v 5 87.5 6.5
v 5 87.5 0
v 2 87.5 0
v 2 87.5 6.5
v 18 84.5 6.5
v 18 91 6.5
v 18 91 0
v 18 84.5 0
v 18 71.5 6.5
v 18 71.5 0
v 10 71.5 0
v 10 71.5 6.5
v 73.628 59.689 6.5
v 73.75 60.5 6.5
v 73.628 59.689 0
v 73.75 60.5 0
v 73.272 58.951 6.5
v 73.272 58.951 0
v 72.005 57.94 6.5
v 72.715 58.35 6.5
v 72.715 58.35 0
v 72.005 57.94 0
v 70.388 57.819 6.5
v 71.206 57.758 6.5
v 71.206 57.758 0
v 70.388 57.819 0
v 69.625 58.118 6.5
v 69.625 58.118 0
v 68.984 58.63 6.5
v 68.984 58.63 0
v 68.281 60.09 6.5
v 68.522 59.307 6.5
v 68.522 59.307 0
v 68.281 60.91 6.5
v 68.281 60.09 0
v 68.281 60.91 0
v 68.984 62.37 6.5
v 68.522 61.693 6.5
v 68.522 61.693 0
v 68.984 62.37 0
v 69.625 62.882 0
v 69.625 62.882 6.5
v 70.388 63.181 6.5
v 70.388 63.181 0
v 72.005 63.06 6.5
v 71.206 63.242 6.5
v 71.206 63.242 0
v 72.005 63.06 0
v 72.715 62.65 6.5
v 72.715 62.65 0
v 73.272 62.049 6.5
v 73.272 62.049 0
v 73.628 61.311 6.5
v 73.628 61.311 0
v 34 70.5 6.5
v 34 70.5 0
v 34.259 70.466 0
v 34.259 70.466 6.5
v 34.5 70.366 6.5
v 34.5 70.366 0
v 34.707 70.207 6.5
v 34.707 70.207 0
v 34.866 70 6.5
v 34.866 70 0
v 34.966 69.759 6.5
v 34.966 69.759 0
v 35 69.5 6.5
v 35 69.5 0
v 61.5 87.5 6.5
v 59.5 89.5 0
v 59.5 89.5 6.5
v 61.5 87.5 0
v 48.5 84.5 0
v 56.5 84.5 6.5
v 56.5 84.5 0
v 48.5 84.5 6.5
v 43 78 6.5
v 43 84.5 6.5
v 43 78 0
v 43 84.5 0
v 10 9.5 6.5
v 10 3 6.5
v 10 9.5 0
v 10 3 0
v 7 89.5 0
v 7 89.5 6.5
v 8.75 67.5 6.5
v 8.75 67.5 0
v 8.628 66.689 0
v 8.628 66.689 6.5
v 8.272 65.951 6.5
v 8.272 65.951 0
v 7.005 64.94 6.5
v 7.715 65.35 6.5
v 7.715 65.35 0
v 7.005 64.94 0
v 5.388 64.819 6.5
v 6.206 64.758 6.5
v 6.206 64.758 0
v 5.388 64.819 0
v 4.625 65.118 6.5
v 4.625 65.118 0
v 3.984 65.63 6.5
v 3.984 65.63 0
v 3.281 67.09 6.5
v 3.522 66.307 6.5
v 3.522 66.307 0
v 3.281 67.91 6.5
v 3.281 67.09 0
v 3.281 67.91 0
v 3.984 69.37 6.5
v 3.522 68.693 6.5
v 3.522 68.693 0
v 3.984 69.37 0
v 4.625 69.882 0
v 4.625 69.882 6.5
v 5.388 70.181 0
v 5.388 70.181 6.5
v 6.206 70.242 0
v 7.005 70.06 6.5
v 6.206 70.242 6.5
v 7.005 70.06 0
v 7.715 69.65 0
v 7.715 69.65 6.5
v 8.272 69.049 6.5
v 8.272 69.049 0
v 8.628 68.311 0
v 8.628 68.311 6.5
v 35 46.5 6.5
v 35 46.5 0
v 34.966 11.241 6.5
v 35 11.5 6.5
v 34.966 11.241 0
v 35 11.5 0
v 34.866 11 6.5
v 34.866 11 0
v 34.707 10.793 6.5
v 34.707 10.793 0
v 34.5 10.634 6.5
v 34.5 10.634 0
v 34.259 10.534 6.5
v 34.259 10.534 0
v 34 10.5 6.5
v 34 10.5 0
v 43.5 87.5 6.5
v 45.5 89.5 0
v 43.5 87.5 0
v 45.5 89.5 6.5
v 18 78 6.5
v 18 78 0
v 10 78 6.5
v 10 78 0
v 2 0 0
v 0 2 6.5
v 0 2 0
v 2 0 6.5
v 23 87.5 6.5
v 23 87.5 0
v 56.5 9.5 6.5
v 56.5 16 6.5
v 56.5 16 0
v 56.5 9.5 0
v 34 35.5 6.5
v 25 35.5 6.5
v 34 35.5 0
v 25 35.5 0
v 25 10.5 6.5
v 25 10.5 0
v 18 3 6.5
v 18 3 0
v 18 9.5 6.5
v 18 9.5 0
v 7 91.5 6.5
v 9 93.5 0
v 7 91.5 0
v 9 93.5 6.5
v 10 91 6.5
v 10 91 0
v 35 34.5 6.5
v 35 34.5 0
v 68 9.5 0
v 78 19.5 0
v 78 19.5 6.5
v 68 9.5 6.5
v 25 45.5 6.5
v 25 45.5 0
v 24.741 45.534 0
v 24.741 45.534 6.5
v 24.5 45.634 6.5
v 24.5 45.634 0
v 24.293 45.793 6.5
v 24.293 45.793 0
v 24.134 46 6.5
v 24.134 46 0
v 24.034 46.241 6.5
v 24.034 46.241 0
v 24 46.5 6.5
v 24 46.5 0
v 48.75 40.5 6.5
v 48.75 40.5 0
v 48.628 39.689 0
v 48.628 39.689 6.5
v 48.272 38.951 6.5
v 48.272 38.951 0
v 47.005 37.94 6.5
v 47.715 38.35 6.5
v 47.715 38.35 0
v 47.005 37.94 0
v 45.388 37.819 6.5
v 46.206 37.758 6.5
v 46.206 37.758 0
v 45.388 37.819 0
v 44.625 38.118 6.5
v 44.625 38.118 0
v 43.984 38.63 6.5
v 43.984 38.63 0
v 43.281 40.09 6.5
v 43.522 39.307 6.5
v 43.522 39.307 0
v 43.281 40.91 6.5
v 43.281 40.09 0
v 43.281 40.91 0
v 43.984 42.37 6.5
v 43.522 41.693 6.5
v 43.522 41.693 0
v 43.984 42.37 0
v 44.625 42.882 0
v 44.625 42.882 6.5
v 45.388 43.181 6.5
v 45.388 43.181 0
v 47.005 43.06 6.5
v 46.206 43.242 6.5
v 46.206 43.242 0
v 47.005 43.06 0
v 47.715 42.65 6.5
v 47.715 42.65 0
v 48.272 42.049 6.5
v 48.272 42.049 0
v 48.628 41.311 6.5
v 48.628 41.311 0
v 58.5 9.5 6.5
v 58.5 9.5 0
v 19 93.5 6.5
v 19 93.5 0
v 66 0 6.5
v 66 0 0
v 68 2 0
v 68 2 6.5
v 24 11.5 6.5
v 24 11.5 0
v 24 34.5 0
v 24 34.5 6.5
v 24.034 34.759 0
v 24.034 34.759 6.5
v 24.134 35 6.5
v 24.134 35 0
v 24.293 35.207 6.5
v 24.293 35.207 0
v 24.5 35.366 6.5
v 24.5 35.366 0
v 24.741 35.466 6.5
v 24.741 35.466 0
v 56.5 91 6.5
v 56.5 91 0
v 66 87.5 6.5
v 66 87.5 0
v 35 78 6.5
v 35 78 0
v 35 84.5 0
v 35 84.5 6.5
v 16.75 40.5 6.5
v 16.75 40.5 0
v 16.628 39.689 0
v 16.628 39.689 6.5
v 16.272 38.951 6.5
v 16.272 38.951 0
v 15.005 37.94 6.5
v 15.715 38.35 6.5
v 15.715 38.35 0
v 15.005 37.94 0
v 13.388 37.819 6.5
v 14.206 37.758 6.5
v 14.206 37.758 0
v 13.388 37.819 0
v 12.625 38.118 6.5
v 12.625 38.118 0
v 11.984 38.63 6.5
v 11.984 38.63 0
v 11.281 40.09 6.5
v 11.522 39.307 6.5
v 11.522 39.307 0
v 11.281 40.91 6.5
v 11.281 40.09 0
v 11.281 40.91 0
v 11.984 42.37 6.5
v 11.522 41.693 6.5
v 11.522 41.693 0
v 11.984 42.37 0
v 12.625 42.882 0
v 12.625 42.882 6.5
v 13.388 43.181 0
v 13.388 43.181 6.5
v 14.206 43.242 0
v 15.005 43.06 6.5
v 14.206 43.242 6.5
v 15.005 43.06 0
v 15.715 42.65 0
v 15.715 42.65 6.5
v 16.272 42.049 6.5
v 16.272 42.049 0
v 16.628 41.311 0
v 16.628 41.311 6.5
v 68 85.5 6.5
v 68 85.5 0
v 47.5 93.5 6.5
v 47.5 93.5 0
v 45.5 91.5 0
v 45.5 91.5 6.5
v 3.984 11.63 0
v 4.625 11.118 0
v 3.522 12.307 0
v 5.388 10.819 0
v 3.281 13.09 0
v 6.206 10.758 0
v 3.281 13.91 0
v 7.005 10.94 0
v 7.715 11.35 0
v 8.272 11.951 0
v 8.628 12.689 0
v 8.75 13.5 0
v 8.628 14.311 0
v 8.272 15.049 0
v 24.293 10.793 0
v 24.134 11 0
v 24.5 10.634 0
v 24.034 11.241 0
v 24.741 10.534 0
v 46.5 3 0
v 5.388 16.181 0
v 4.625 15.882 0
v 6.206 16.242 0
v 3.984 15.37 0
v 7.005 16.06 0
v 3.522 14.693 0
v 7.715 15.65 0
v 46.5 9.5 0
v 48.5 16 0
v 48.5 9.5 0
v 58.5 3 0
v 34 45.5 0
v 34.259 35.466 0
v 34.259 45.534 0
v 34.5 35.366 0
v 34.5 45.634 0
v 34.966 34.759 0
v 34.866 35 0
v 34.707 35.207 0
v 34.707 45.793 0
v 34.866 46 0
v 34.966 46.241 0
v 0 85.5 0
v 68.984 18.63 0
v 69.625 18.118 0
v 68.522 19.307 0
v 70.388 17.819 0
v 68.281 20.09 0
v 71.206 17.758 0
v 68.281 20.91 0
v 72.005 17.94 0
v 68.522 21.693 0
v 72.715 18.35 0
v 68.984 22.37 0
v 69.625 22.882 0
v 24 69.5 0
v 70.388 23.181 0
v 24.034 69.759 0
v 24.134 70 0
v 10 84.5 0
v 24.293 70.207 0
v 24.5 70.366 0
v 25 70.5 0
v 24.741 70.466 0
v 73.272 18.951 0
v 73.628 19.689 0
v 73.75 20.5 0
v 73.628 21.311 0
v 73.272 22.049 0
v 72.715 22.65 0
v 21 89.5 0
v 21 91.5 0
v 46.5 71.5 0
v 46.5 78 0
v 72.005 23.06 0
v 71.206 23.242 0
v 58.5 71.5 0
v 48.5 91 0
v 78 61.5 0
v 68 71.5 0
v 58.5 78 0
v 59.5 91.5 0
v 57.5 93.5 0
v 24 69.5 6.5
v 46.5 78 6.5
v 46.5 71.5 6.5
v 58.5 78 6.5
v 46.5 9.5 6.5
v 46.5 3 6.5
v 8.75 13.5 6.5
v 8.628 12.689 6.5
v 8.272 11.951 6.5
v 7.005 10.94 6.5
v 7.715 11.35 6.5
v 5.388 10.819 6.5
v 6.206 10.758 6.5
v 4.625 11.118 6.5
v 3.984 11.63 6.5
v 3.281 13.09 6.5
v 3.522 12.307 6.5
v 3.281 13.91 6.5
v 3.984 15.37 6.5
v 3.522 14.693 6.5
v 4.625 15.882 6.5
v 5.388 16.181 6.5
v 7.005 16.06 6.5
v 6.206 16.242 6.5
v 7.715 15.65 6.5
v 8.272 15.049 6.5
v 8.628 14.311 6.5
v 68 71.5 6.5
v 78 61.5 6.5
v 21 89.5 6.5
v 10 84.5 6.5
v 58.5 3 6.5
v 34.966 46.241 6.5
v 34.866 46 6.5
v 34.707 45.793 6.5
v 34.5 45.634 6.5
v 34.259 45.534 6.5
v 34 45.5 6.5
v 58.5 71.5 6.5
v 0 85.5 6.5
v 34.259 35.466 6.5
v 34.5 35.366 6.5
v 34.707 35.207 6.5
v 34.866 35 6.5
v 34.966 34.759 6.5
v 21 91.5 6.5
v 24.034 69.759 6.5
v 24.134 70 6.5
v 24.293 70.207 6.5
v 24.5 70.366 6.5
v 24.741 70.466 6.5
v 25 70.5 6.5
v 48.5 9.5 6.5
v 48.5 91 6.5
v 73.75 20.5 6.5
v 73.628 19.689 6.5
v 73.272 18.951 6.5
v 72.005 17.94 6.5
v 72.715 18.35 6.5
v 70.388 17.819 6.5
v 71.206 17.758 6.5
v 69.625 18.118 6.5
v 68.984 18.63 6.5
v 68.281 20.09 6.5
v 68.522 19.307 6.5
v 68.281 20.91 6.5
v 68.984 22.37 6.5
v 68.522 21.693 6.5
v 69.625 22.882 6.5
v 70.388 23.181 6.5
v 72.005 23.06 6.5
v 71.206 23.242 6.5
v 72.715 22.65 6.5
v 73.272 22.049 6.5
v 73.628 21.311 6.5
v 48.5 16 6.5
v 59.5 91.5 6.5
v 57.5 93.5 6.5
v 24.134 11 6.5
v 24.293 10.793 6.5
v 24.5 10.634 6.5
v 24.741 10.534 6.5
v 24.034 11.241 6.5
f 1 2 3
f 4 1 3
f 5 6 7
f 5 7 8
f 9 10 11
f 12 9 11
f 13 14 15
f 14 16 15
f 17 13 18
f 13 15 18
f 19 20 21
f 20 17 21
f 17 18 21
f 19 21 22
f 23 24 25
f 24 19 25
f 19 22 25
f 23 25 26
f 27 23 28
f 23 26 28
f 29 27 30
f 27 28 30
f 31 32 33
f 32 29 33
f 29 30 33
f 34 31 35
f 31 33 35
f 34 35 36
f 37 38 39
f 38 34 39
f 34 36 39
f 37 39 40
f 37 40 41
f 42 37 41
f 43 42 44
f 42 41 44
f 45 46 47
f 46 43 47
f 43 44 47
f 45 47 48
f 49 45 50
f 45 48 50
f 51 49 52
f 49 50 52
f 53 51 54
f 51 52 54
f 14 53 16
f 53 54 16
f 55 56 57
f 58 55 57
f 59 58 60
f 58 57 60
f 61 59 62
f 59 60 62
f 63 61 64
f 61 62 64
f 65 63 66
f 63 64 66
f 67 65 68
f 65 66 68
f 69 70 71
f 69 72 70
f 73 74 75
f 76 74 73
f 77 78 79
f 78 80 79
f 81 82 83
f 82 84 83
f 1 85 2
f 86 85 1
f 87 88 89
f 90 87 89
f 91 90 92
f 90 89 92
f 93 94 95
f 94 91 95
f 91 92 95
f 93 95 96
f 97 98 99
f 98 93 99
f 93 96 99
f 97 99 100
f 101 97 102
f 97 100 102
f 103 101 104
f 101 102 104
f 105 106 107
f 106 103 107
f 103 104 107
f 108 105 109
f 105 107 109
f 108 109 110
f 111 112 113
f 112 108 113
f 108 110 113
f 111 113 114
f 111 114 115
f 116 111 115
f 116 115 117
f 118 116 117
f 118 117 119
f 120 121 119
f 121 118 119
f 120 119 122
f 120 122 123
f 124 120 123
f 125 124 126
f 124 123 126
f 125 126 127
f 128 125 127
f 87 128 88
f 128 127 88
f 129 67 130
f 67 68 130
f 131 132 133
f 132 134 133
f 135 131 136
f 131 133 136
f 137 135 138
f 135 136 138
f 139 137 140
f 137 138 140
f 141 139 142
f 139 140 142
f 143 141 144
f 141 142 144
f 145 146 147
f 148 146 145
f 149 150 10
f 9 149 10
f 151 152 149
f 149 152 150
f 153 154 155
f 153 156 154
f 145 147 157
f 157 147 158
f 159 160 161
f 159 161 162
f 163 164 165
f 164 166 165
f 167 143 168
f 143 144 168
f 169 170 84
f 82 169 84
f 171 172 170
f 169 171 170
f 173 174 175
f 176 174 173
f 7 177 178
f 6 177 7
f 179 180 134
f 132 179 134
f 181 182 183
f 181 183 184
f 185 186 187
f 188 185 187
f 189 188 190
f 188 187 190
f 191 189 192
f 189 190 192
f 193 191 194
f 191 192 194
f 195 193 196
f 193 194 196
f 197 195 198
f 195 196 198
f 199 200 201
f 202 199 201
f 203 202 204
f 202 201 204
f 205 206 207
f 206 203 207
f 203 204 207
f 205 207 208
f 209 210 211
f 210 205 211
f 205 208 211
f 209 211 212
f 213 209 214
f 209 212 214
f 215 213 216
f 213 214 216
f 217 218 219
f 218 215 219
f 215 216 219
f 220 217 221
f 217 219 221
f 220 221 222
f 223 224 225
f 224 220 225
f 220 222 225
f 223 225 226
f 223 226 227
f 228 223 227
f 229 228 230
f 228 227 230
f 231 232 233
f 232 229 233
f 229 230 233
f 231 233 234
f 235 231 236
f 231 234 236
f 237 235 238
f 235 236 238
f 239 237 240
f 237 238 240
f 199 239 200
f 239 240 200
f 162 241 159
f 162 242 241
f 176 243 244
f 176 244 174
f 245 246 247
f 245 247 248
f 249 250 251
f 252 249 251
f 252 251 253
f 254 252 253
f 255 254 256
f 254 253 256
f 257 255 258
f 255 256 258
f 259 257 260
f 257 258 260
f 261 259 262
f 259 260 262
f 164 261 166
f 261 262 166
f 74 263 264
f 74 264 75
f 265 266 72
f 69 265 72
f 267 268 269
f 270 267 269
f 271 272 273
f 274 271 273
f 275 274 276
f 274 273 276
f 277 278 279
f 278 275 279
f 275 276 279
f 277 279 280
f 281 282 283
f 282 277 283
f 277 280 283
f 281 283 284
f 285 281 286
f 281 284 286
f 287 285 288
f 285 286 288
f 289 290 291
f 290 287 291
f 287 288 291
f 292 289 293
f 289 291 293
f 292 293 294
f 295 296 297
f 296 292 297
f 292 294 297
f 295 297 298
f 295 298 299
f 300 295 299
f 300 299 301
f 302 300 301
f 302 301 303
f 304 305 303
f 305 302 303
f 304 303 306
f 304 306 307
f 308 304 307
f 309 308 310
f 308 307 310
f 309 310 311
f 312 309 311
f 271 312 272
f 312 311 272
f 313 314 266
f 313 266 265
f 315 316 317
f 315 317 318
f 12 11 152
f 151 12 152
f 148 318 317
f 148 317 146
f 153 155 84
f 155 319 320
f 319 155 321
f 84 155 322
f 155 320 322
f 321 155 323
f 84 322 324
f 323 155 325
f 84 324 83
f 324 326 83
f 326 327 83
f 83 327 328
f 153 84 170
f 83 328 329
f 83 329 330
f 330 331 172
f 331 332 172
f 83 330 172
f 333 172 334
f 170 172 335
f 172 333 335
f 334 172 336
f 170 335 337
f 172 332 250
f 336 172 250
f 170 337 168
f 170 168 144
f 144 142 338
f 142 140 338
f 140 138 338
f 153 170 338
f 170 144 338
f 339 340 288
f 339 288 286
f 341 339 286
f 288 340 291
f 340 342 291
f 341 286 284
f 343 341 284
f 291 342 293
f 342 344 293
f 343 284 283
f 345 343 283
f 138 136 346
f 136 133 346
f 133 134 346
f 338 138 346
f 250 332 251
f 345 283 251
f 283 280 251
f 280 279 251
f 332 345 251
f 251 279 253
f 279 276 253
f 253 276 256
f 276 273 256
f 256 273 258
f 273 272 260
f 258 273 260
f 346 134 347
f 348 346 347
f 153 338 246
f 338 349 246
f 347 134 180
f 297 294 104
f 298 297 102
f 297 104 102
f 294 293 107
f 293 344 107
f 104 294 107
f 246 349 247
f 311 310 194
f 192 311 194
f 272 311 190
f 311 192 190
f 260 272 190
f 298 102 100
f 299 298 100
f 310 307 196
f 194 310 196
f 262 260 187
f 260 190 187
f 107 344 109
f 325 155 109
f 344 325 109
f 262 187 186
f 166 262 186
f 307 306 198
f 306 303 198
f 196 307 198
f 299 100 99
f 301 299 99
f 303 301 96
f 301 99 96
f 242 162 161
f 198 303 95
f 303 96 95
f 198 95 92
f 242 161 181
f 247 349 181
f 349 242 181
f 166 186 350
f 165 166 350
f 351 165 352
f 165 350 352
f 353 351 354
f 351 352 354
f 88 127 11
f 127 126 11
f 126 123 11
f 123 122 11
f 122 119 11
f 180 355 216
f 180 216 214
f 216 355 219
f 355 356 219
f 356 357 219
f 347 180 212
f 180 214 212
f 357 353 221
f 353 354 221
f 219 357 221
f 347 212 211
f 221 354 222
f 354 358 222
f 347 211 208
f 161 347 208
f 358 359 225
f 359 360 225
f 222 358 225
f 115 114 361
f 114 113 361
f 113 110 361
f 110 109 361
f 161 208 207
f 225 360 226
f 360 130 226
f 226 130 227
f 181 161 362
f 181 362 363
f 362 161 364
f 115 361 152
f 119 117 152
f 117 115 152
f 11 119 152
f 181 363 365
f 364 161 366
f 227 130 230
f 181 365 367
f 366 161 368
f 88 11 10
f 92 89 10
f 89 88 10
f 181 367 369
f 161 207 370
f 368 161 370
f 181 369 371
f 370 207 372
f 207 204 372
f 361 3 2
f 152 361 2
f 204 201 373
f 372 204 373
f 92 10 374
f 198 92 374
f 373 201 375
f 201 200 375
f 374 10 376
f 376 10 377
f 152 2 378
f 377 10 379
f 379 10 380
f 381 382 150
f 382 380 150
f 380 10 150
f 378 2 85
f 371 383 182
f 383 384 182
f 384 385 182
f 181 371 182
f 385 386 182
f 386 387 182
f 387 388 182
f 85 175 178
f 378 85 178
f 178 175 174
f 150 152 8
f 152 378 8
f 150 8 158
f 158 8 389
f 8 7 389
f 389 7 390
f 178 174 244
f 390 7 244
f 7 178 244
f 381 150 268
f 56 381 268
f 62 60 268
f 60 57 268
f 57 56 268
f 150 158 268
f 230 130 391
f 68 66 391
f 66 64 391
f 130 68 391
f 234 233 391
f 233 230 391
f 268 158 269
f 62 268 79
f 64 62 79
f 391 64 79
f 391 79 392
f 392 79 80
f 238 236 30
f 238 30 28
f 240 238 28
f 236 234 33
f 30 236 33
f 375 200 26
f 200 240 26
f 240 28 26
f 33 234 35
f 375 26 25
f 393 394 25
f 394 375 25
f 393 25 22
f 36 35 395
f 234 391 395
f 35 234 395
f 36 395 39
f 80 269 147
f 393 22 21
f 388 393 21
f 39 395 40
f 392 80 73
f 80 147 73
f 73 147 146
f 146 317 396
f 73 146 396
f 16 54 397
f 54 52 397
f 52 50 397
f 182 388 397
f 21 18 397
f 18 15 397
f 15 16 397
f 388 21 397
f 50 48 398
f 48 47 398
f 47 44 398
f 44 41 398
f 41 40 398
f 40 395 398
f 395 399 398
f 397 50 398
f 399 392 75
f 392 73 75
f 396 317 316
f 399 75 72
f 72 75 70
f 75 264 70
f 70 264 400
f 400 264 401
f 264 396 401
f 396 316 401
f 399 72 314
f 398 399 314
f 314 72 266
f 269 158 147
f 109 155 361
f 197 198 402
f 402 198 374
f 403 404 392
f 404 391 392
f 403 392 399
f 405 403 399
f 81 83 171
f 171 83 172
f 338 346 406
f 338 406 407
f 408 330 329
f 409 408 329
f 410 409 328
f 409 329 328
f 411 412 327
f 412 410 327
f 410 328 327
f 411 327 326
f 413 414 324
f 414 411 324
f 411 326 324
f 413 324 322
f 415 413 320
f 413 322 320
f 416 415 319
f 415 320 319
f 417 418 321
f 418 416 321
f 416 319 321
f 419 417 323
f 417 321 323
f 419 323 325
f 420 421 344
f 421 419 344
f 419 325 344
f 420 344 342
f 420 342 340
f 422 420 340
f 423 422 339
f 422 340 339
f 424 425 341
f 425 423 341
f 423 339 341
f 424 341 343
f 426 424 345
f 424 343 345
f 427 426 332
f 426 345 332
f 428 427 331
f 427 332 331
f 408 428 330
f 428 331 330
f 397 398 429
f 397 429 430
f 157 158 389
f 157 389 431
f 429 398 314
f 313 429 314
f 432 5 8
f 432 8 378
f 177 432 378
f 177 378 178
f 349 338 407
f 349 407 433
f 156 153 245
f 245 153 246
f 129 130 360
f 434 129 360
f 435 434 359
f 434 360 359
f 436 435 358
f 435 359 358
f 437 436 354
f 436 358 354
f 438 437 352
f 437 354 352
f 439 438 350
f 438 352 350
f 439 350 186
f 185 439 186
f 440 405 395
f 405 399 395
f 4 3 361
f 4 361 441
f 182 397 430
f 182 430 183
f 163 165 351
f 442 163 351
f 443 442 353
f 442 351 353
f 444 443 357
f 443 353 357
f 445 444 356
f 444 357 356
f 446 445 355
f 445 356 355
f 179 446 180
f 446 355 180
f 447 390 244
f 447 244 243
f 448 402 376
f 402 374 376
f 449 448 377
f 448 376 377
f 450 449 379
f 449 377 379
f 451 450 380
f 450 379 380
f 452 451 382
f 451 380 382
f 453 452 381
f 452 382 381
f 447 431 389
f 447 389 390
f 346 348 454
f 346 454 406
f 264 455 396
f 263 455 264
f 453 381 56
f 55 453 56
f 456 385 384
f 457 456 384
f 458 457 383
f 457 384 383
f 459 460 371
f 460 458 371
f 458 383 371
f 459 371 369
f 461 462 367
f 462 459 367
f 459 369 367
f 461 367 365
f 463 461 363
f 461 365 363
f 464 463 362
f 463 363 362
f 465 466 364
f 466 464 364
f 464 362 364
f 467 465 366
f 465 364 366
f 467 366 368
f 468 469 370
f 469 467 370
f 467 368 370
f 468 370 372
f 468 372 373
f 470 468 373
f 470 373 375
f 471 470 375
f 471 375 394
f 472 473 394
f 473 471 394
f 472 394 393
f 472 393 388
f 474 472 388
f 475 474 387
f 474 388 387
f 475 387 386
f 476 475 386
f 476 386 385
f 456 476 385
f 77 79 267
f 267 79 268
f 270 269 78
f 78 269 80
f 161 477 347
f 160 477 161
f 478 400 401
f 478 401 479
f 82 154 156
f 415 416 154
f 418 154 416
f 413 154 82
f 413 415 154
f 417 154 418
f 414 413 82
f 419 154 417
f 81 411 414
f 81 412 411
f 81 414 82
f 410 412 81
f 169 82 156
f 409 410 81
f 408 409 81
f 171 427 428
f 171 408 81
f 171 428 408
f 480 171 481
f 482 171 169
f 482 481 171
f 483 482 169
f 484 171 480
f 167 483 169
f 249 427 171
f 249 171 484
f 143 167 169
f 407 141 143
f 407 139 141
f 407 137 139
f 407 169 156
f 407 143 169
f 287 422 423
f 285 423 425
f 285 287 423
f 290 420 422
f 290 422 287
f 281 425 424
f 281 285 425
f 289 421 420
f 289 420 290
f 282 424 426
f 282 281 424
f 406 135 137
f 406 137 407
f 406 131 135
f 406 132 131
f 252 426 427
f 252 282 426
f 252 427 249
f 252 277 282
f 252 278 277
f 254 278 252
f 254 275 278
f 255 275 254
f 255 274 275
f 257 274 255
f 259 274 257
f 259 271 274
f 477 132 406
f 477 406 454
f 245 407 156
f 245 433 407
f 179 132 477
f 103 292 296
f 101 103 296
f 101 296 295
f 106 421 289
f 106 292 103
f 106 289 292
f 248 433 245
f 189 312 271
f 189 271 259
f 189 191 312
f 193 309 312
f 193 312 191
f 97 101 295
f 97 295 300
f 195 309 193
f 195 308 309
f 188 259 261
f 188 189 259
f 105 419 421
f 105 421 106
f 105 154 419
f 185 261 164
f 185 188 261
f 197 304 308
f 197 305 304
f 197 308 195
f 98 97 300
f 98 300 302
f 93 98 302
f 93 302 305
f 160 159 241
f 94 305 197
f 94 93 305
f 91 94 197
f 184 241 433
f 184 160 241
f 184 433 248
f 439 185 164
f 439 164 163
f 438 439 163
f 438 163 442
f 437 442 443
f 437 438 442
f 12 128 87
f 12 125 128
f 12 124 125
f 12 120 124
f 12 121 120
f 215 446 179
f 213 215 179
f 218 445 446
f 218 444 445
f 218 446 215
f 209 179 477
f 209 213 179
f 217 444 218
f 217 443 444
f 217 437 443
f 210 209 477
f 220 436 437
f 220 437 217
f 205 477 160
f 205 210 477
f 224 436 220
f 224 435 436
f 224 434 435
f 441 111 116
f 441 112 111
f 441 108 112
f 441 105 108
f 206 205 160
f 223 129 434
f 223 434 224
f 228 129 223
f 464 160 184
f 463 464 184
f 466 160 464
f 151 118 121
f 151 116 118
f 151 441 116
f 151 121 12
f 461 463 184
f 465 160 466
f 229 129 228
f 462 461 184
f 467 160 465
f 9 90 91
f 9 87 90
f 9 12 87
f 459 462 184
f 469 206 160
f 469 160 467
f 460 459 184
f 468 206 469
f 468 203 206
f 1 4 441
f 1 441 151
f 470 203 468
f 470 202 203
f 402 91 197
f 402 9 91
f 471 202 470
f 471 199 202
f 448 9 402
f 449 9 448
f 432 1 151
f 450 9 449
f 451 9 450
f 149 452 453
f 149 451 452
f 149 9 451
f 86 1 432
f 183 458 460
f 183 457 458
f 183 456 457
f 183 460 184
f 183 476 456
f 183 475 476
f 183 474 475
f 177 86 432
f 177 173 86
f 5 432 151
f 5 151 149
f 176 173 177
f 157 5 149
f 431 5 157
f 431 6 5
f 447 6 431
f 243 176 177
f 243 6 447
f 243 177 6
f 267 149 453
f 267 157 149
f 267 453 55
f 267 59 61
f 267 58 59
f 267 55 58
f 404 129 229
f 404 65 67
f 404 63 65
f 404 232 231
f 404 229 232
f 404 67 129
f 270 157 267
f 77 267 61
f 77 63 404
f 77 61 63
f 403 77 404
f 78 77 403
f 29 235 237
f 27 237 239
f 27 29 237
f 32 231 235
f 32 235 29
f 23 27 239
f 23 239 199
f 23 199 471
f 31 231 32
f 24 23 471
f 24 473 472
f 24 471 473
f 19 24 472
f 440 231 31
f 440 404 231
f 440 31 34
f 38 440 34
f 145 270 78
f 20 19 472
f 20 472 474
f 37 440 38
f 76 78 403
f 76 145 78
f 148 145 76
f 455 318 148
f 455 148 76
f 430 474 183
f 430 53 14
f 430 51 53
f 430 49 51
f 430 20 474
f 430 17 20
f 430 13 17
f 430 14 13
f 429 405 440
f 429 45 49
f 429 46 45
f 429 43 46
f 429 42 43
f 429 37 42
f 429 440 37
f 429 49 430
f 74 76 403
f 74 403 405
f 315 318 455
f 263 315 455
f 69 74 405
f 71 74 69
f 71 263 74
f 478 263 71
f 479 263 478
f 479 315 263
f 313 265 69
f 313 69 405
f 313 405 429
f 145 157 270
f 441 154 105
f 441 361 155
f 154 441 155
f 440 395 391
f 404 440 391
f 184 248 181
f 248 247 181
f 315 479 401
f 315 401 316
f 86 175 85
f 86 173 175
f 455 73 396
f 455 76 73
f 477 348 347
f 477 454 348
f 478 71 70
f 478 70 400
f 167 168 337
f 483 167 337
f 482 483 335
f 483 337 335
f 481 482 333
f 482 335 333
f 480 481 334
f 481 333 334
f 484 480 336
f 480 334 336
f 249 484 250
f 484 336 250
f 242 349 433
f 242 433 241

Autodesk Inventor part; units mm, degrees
ref_plane "YZ Plane" through (0, 0, 0) normal (1, 0, 0) x (0, 1, 0)
ref_plane "XZ Plane" through (0, 0, 0) normal (0, 1, 0) x (-1, 0, 0)
ref_plane "XY Plane" through (0, 0, 0) normal (0, 0, 1) x (1, 0, 0)
sketch "Sketch1" plane through (0, 0, 0) normal (0, 0, 1) x (1, 0, 0)
  line L0 (0, 0) -> (68, 0)
  line L1 (68, 87.5) -> (0, 87.5)
  line L2 (0, 87.5) -> (0, 0)
  line L3 (68, 71.5) -> (78, 61.5)
  line L4 (78, 61.5) -> (78, 19.5)
  line L5 (78, 19.5) -> (68, 9.5)
  line L6 (68, 0) -> (68, 9.5)
  line L7 (68, 71.5) -> (68, 87.5)
  line L8 (35, 84.5) -> (43, 84.5)
  line L9 (43, 84.5) -> (43, 78)
  line L10 (43, 78) -> (35, 78)
  line L11 (35, 78) -> (35, 84.5)
  line L12 (10, 78) -> (18, 78)
  line L13 (18, 78) -> (18, 71.5)
  line L14 (18, 71.5) -> (10, 71.5)
  line L15 (10, 71.5) -> (10, 78)
  line L16 (10, 9.5) -> (18, 9.5)
  line L17 (18, 9.5) -> (18, 3)
  line L18 (18, 3) -> (10, 3)
  line L19 (10, 3) -> (10, 9.5)
  line L20 (25, 70.5) -> (34, 70.5)
  line L21 (35, 69.5) -> (35, 46.5)
  line L22 (34, 45.5) -> (25, 45.5)
  line L23 (24, 46.5) -> (24, 69.5)
  line L24 (25, 35.5) -> (34, 35.5)
  line L25 (35, 34.5) -> (35, 11.5)
  line L26 (34, 10.5) -> (25, 10.5)
  line L27 (24, 11.5) -> (24, 34.5)
  arc A0 (25, 70.5) -> (24, 69.5) centre (25, 69.5) ccw
  arc A1 (35, 69.5) -> (34, 70.5) centre (34, 69.5) ccw
  arc A2 (34, 45.5) -> (35, 46.5) centre (34, 46.5) ccw
  arc A3 (24, 46.5) -> (25, 45.5) centre (25, 46.5) ccw
  arc A4 (25, 35.5) -> (24, 34.5) centre (25, 34.5) ccw
  arc A5 (24, 11.5) -> (25, 10.5) centre (25, 11.5) ccw
  arc A6 (34, 10.5) -> (35, 11.5) centre (34, 11.5) ccw
  arc A7 (35, 34.5) -> (34, 35.5) centre (34, 34.5) ccw
  line L28 (29.5, 70.5) -> (29.5, 10.5) construction
  circle A8 centre (71, 60.5) radius 2.75
  circle A9 centre (71, 20.5) radius 2.75
  line L29 (46.5, 3) -> (58.5, 3)
  line L30 (58.5, 3) -> (58.5, 9.5)
  line L31 (58.5, 9.5) -> (46.5, 9.5)
  line L32 (46.5, 9.5) -> (46.5, 3)
  circle A10 centre (6, 13.5) radius 5 construction
  circle A11 centre (6, 13.5) radius 2.75
  circle A12 centre (6, 67.5) radius 5 construction
  circle A13 centre (6, 67.5) radius 2.75
  line L33 (46.5, 78) -> (58.5, 78)
  line L34 (58.5, 78) -> (58.5, 71.5)
  line L35 (58.5, 71.5) -> (46.5, 71.5)
  line L36 (46.5, 71.5) -> (46.5, 78)
  line L37 (21, 84.5) -> (29, 84.5)
  line L38 (29, 84.5) -> (29, 78)
  line L39 (29, 78) -> (21, 78)
  line L40 (21, 78) -> (21, 84.5)
  circle A14 centre (71, 60.5) radius 5 construction
  circle A15 centre (71, 20.5) radius 5 construction
  circle A16 centre (14, 40.5) radius 5 construction
  circle A17 centre (46, 40.5) radius 5 construction
  circle A18 centre (46, 40.5) radius 2.75
  circle A19 centre (14, 40.5) radius 2.75
  line L41 (50, 87.5) -> (50, 0) construction
  line L42 (55, 87.5) -> (55, 0) construction
  line L43 (52.5, 87.5) -> (52.5, 0) construction
  line L44 (72, 13.5) -> (0, 13.5) construction
  line L45 (72, 67.5) -> (0, 67.5) construction
  point P0 (78, 40.5)
  point P1 (52.5, 3)
  dimension "d1" = 45
  dimension "d2" = 10
  dimension "d3" = 6.5
  dimension "d4" = 6.5
  dimension "d5" = 8
  dimension "d6" = 8
  dimension "d7" = 3
  dimension "d8" = 6.5
  dimension "d9" = 3
  dimension "d12" = 1
  dimension "d13" = 11
  dimension "d14" = 25
  dimension "d15" = 25
  dimension "d16" = 1
  dimension "d17" = 1
  dimension "d18" = 38.5
  dimension "d19" = 5.5
  dimension "d20" = 5.5
  dimension "d21" = 7
  dimension "d24" = 12
  dimension "d25" = 11
  dimension "d26" = 11
  dimension "d27" = 10
  dimension "d28" = 5.5
  dimension "d29" = 5.5
  dimension "d30" = 10
  dimension "d32" = 4
  dimension "d33" = 4
  dimension "d34" = 4
  dimension "d35" = 6
  dimension "d36" = 68
  dimension "d39" = 8
  dimension "d40" = 3
  dimension "d41" = 10
  dimension "d42" = 10
  dimension "d43" = 4
  dimension "d44" = 10
  dimension "d45" = 5.5
  dimension "d46" = 10
  dimension "d47" = 5.5
  dimension "d49" = 14
  dimension "d50" = 32
  dimension "d51" = 5
  dimension "d52" = 2.5
  dimension "d53" = 15.5
  dimension "d92" = 4
  dimension "d93" = 4
  dimension "d94" = 54
  dimension "d95" = 6
extrude "Extrusion1" add sketch "Sketch1" along normal blind 6.5
chamfer "Chamfer1" distance 2 angle 45 4 edges at (0, 0, 3.25) (68, 0, 3.25) (68, 87.5, 3.25) (0, 87.5, 3.25)
sketch "Sketch2" plane through (0, 0, 6.5) normal (0, 0, 1) x (1, 0, 0)
  line L0 (46.5, 9.5) -> (58.5, 9.5) projected
  line L1 (68, 2) -> (68, 9.5) projected
  line L2 (48.5, 16) -> (56.5, 16)
  line L3 (56.5, 16) -> (56.5, 9.5)
  line L4 (56.5, 9.5) -> (48.5, 9.5)
  line L5 (48.5, 9.5) -> (48.5, 16)
  point P0 (0, 0)
  dimension "d59" = 6.5
  dimension "d60" = 8
  dimension "d63" = 11.5
extrude "Extrusion2" cut sketch "Sketch2" against normal through all
sketch "Sketch3" plane through (0, 0, 6.5) normal (0, 0, 1) x (1, 0, 0)
  line L0 (29, 84.5) -> (29, 78) projected
  line L1 (29, 78) -> (21, 78) projected
  line L2 (21, 78) -> (21, 84.5) projected
  line L3 (21, 84.5) -> (29, 84.5) projected
  point P0 (0, 0)
extrude "Extrusion3" add sketch "Sketch3" against normal blind 6.5
sketch "Sketch6" plane through (0, 0, 6.5) normal (0, 0, 1) x (1, 0, 0)
  line L0 (18, 78) -> (18, 71.5) projected
  line L1 (10, 71.5) -> (10, 78) projected
  line L2 (66, 87.5) -> (2, 87.5) projected
  line L3 (7, 87.5) -> (21, 87.5)
  line L4 (21, 87.5) -> (21, 93.5)
  line L5 (21, 93.5) -> (7, 93.5)
  line L6 (7, 93.5) -> (7, 87.5)
  line L7 (45.5, 87.5) -> (59.5, 87.5)
  line L8 (59.5, 87.5) -> (59.5, 93.5)
  line L9 (59.5, 93.5) -> (45.5, 93.5)
  line L10 (45.5, 93.5) -> (45.5, 87.5)
  line L11 (46.5, 78) -> (58.5, 78) projected
  point P0 (0, 0)
  point P1 (52.5, 93.5)
  point P2 (52.5, 78)
  dimension "d80" = 3
  dimension "d81" = 3
  dimension "d84" = 6
extrude "Extrusion6" add sketch "Sketch6" against normal blind 6.5
sketch "Sketch7" plane through (0, 0, 6.5) normal (0, 0, 1) x (1, 0, 0)
  line L0 (18, 78) -> (18, 71.5) projected
  line L1 (10, 71.5) -> (10, 78) projected
  line L2 (43, 84.5) -> (43, 78) projected
  line L3 (35, 78) -> (35, 84.5) projected
  line L4 (35, 84.5) -> (43, 84.5) projected
  line L5 (10, 91) -> (18, 91)
  line L6 (18, 91) -> (18, 84.5)
  line L7 (18, 84.5) -> (10, 84.5)
  line L8 (10, 84.5) -> (10, 91)
  line L9 (48.5, 91) -> (56.5, 91)
  line L10 (56.5, 91) -> (56.5, 84.5)
  line L11 (56.5, 84.5) -> (48.5, 84.5)
  line L12 (48.5, 84.5) -> (48.5, 91)
  line L13 (59.5, 93.5) -> (45.5, 93.5) projected
  point P0 (0, 0)
  point P1 (52.5, 91)
  point P2 (52.5, 93.5)
extrude "Extrusion7" cut sketch "Sketch7" against normal blind 6.5
chamfer "Chamfer3" distance 2 angle 45 8 edges at (7, 87.5, 3.25) (7, 93.5, 3.25) (21, 93.5, 3.25) (21, 87.5, 3.25) (45.5, 87.5, 3.25) (45.5, 93.5, 3.25) (59.5, 93.5, 3.25) (59.5, 87.5, 3.25)
properties part number "x_motor_top" material "Plywood, Finish"
